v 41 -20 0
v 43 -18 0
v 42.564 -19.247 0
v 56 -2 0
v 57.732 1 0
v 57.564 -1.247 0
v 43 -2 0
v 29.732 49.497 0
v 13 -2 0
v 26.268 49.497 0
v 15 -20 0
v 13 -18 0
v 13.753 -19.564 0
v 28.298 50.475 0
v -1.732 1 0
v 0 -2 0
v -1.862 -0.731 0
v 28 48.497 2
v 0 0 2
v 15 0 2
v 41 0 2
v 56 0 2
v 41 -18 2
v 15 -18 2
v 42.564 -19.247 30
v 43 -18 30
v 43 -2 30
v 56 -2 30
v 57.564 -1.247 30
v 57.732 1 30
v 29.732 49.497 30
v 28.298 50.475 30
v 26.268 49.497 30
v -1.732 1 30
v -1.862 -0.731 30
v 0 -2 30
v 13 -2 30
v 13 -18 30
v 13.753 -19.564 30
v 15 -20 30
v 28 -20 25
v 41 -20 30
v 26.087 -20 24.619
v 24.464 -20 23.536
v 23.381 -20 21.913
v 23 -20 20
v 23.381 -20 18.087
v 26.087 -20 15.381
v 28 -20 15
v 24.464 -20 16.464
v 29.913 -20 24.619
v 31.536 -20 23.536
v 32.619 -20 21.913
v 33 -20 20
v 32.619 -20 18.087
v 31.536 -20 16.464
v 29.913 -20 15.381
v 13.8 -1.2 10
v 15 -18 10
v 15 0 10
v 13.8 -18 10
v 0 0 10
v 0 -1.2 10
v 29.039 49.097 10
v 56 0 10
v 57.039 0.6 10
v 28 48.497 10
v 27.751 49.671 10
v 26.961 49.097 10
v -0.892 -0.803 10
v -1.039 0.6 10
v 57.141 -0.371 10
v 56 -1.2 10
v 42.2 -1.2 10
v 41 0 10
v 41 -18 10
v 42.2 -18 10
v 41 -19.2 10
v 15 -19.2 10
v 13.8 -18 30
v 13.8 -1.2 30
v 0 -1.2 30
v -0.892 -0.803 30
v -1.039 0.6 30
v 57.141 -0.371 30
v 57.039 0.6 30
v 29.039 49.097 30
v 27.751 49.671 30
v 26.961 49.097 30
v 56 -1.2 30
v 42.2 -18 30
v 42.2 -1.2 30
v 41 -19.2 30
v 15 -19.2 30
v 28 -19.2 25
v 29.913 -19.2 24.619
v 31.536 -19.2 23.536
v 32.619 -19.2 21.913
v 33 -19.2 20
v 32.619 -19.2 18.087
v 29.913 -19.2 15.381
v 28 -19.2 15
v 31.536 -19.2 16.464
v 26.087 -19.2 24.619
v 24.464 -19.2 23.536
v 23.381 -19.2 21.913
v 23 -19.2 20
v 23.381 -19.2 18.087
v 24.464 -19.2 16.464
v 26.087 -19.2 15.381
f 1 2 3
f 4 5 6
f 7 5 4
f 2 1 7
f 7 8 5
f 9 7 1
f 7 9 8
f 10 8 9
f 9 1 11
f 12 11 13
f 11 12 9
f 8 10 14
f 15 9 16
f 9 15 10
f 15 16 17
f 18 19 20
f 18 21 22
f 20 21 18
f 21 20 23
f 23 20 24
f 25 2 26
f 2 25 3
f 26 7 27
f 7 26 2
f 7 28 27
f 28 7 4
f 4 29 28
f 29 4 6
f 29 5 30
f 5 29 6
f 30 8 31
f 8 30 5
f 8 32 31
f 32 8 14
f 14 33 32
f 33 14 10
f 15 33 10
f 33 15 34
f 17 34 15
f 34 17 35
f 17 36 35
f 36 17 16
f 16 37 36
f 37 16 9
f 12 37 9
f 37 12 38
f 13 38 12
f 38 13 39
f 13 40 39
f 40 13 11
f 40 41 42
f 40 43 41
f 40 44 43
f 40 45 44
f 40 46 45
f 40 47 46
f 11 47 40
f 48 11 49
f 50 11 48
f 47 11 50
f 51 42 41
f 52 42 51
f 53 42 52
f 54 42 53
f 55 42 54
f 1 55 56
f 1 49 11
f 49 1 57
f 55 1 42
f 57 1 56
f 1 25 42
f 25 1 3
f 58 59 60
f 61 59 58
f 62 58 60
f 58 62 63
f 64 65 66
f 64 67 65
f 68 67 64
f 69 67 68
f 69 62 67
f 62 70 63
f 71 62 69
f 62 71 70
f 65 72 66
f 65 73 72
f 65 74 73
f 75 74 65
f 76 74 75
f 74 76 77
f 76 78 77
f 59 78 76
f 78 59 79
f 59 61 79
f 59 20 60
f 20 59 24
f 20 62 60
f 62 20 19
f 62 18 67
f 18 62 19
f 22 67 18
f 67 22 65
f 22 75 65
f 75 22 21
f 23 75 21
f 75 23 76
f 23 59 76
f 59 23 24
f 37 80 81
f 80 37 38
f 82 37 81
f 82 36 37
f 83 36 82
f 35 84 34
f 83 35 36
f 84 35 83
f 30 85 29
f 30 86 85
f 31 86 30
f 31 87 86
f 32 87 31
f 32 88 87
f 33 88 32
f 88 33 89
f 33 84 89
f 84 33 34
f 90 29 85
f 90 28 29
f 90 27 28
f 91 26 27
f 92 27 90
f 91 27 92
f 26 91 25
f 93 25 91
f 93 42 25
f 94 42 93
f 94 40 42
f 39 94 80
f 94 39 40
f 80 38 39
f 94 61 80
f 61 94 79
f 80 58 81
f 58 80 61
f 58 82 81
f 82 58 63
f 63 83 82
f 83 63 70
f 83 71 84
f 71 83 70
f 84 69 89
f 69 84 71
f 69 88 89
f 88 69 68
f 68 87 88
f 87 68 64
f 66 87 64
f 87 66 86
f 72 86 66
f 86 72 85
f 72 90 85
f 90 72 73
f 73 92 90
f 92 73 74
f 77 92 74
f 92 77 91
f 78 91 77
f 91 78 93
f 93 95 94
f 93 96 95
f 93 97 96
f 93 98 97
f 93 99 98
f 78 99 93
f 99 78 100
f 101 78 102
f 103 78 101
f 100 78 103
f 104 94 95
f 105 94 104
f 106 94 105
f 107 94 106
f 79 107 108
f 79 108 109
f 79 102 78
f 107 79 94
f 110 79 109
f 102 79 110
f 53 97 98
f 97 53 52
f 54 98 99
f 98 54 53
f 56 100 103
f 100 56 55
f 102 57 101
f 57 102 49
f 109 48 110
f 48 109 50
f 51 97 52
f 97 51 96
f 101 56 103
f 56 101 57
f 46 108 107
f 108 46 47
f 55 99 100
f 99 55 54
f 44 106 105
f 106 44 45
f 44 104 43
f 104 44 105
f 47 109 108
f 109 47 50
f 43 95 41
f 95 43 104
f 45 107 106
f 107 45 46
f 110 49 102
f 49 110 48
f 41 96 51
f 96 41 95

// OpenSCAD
// file: SnapContainer.scad
tolerance = 0.4;

module container_shape(width, box_width, box_depth) {
    polygon([[0,0], [width,0], [width/2,sin(60) * width]]);
    center_align_offset =  (width-box_width)/2;
    polygon([
        [center_align_offset,0],
        [width-center_align_offset,0],
        [width-center_align_offset,-box_depth],
        [center_align_offset,-box_depth]
    ]);
}

module triangle_container(width, height, box_width, box_depth, wall_thickness=2) {
	linear_extrude(wall_thickness) {
        offset(wall_thickness) {
            container_shape(width, box_width, box_depth);
        }
	}

    translate([0,0,wall_thickness]) {
        linear_extrude(height-wall_thickness) {
            difference() {
                offset(wall_thickness) {
                    container_shape(width, box_width, box_depth);
                }
                container_shape(width, box_width, box_depth);
            }
        }
    }
}

module triangle_container_case(width, height, box_width=0, box_depth=0, box_height=0, wall_thickness=2, overlap = 20) {
	
	triangle_container(width, height-overlap, box_width, box_depth, wall_thickness);
    linear_extrude(height-box_height) {
        center_align_offset =  (width-box_width)/2;
        polygon([
            [center_align_offset,0],
            [width-center_align_offset,0],
            [width-center_align_offset,-box_depth],
            [center_align_offset,-box_depth]
        ]);
    }

	translate([0,0,height-overlap]) {
		linear_extrude(overlap) {
			difference() {
				offset(wall_thickness/2 - tolerance/2) {
					container_shape(width, box_width, box_depth);
				}
				container_shape(width, box_width, box_depth);
				
			}
		}
        translate([width/2,-box_depth,overlap/2]) {
            rotate([90,0,0]) linear_extrude(wall_thickness) circle(5 - tolerance);
        }
	}
}

module triangle_container_lid(width, height, box_width=0, box_depth=0, wall_thickness=2, overlap = 20) {

	triangle_container(width, height, box_width, box_depth, wall_thickness);
	translate([0,0,height]) {
        difference() {
            linear_extrude(overlap) {
                difference() {
                    offset(wall_thickness) {
                        container_shape(width, box_width, box_depth);
                    }
                    offset(wall_thickness/2 + tolerance/2)
                    container_shape(width, box_width, box_depth);
                }
            }
            translate([width/2,-box_depth,overlap/2]) {
                rotate([90,0,0]) linear_extrude(wall_thickness+3) circle(5);
            }
        }
	}
}




width = 26;
height = 25;
box_width = 0;
box_depth = 0;
box_height = 0;
lid_height = 5;

// Case
triangle_container_case(width, height, box_width, box_depth, 
box_height - lid_height, 2, 20);

//Lid
translate([width + 20, 0, 0])
triangle_container_lid(width, lid_height, box_width, box_depth,
 2, 20);
// main file
use <SnapContainer.scad>;

module incut(incut_width, incut_height, incut_offset) {
    translate([-10,5, incut_height/2 + 7 + 2]) {
        rotate([0,90,0]) {
            linear_extrude(width + 15) {
                polygon([[0,0],[incut_width,0],[0,incut_height/2]]);
                polygon([[incut_width + incut_offset,incut_offset],[incut_width + incut_offset,incut_height/2 + incut_offset],[incut_offset,incut_height/2 + incut_offset]]); 
                mirror([1,0,0]) {
                    polygon([[0,0],[incut_width,0],[0,incut_height/2]]);
                    polygon([[incut_width + incut_offset,incut_offset],[incut_width + incut_offset,incut_height/2 + incut_offset],[incut_offset,incut_height/2 + incut_offset]]); 
                }
            }
        }
    }
}

width = 56;
height = 110;
box_width = 26;
box_depth = 18;
box_height = 85;
lid_height = 10;

// Case
/*difference() {
    
    triangle_container_case(width, height - lid_height, box_width, box_depth, box_height - lid_height, 2, 20);
    incut(30, 70, 5);

}*/

//Lid
//translate([width + 20, 0, 0])
triangle_container_lid(width, lid_height, box_width, box_depth, 2, 20);
